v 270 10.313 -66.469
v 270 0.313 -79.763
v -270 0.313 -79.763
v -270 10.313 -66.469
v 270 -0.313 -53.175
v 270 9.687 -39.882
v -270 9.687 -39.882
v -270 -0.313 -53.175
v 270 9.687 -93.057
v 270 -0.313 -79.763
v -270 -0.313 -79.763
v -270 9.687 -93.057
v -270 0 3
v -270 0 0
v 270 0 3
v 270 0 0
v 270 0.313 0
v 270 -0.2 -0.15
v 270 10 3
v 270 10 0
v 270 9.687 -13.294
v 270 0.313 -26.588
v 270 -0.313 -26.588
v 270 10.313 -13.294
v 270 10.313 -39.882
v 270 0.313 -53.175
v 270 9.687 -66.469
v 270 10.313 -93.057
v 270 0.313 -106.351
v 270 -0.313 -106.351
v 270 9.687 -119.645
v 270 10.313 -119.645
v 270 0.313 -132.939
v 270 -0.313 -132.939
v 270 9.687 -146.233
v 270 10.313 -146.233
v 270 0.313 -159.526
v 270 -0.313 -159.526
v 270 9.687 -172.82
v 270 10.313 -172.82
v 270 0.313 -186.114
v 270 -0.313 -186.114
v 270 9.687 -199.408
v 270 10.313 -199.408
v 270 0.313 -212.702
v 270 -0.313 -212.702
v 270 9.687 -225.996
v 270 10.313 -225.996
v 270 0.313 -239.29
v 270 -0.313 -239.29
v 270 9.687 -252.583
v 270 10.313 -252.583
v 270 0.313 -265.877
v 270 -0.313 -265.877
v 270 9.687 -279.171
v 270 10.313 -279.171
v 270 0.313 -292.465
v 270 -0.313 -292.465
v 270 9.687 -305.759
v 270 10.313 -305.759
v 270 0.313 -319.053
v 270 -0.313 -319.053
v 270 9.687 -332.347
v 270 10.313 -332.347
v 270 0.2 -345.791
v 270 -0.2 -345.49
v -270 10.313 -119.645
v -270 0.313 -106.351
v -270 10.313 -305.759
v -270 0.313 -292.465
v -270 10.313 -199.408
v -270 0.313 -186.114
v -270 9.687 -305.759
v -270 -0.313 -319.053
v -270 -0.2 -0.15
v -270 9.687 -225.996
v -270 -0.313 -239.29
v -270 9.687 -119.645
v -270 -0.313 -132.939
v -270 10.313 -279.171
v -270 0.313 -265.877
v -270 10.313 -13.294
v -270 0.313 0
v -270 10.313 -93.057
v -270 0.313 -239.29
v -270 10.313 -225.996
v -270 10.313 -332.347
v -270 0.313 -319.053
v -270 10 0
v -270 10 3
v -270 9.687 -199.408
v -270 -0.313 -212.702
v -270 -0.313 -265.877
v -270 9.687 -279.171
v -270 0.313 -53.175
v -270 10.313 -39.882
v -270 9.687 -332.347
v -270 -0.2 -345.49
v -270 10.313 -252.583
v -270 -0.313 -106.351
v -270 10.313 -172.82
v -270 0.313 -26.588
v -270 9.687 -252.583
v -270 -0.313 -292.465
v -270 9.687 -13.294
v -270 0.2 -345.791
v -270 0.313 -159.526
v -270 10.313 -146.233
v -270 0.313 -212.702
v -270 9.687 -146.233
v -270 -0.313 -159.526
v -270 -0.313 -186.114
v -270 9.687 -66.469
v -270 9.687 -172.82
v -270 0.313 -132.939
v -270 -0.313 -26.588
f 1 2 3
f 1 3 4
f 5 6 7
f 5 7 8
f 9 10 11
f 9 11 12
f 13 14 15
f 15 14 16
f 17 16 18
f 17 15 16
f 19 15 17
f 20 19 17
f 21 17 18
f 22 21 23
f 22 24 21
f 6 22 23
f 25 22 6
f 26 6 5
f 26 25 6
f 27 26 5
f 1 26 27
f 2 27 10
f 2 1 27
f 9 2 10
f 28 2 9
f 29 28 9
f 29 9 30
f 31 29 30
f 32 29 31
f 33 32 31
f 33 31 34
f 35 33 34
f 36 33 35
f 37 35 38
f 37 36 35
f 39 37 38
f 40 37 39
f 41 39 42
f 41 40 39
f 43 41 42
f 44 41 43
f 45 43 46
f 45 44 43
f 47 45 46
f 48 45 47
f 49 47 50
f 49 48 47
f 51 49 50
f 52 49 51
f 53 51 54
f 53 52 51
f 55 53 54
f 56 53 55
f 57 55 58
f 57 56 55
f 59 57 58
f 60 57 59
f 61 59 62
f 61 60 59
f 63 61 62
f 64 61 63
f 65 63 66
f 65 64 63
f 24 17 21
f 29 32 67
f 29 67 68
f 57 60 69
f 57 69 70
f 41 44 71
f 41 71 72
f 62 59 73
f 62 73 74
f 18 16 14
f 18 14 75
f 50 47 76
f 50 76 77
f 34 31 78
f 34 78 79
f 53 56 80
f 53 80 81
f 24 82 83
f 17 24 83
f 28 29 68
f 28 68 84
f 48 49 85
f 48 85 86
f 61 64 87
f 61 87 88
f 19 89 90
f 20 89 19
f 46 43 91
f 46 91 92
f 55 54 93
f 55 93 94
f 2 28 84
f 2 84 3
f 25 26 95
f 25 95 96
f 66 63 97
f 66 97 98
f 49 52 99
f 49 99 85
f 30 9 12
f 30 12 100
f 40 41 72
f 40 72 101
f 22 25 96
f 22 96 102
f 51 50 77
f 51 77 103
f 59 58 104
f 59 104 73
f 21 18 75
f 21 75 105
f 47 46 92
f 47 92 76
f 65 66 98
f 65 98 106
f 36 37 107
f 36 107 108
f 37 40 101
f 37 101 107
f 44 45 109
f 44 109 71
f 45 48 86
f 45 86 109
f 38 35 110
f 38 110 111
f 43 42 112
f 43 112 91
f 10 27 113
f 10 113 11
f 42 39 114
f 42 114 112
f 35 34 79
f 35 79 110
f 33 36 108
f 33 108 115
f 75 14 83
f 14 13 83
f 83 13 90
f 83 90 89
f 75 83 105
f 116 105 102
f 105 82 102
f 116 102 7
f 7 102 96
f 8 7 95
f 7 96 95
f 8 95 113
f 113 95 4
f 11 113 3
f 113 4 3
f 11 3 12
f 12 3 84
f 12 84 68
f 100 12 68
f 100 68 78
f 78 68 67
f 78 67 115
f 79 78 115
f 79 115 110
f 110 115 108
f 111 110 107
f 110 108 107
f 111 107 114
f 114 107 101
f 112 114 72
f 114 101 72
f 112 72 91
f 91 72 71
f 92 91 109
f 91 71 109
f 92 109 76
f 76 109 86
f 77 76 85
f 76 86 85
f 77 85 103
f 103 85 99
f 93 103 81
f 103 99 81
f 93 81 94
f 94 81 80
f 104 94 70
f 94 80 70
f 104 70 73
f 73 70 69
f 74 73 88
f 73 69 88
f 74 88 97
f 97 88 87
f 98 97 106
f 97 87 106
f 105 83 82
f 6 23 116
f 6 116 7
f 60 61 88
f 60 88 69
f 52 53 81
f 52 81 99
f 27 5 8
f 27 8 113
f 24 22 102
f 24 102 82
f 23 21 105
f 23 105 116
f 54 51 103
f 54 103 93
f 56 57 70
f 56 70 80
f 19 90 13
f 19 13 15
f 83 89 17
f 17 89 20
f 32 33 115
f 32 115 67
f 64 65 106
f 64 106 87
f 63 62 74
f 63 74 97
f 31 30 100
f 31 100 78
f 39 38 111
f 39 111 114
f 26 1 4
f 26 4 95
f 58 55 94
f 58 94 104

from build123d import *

# Parameters (mm, degrees)
SKETCH2_W           = 540
SKETCH2_H           = 10
BOSS_EXTRUDE1_DEPTH = 3
EXTRUDE_THIN1_DEPTH = 540


with BuildPart() as part:
    # Sketch2 → Boss-Extrude1 (new body)
    with BuildSketch(Plane.XY):
        with Locations((0, 5)):
            Rectangle(SKETCH2_W, SKETCH2_H)
    extrude(amount=BOSS_EXTRUDE1_DEPTH)

    # Sketch3 → Extrude-Thin1 (add, through all)
    with BuildSketch(Plane(origin=(270, 0, 0), x_dir=(0, 0, -1), z_dir=(1, 0, 0))):
        Polygon((0.150284541, -0.199786278), (13.293867572, 9.687165702), (26.587735145, -0.312834298), (39.881602717, 9.687165702), (53.175470289, -0.312834298), (66.469337861, 9.687165702), (79.763205434, -0.312834298), (93.057073006, 9.687165702), (106.350940578, -0.312834298), (119.64480815, 9.687165702), (132.938675723, -0.312834298), (146.232543295, 9.687165702), (159.526410867, -0.312834298), (172.820278439, 9.687165702), (186.114146012, -0.312834298), (199.408013584, 9.687165702), (212.701881156, -0.312834298), (225.995748728, 9.687165702), (239.289616301, -0.312834298), (252.583483873, 9.687165702), (265.877351445, -0.312834298), (279.171219017, 9.687165702), (292.46508659, -0.312834298), (305.758954162, 9.687165702), (319.052821734, -0.312834298), (332.346689306, 9.687165702), (345.490272338, -0.199786278), (345.790841419, 0.199786278), (332.346689306, 10.312834298), (319.052821734, 0.312834298), (305.758954162, 10.312834298), (292.46508659, 0.312834298), (279.171219017, 10.312834298), (265.877351445, 0.312834298), (252.583483873, 10.312834298), (239.289616301, 0.312834298), (225.995748728, 10.312834298), (212.701881156, 0.312834298), (199.408013584, 10.312834298), (186.114146012, 0.312834298), (172.820278439, 10.312834298), (159.526410867, 0.312834298), (146.232543295, 10.312834298), (132.938675723, 0.312834298), (119.64480815, 10.312834298), (106.350940578, 0.312834298), (93.057073006, 10.312834298), (79.763205434, 0.312834298), (66.469337861, 10.312834298), (53.175470289, 0.312834298), (39.881602717, 10.312834298), (26.587735145, 0.312834298), (13.293867572, 10.312834298), (-0.150284541, 0.199786278), align=None)
    extrude(amount=-EXTRUDE_THIN1_DEPTH)


solid = part.part
